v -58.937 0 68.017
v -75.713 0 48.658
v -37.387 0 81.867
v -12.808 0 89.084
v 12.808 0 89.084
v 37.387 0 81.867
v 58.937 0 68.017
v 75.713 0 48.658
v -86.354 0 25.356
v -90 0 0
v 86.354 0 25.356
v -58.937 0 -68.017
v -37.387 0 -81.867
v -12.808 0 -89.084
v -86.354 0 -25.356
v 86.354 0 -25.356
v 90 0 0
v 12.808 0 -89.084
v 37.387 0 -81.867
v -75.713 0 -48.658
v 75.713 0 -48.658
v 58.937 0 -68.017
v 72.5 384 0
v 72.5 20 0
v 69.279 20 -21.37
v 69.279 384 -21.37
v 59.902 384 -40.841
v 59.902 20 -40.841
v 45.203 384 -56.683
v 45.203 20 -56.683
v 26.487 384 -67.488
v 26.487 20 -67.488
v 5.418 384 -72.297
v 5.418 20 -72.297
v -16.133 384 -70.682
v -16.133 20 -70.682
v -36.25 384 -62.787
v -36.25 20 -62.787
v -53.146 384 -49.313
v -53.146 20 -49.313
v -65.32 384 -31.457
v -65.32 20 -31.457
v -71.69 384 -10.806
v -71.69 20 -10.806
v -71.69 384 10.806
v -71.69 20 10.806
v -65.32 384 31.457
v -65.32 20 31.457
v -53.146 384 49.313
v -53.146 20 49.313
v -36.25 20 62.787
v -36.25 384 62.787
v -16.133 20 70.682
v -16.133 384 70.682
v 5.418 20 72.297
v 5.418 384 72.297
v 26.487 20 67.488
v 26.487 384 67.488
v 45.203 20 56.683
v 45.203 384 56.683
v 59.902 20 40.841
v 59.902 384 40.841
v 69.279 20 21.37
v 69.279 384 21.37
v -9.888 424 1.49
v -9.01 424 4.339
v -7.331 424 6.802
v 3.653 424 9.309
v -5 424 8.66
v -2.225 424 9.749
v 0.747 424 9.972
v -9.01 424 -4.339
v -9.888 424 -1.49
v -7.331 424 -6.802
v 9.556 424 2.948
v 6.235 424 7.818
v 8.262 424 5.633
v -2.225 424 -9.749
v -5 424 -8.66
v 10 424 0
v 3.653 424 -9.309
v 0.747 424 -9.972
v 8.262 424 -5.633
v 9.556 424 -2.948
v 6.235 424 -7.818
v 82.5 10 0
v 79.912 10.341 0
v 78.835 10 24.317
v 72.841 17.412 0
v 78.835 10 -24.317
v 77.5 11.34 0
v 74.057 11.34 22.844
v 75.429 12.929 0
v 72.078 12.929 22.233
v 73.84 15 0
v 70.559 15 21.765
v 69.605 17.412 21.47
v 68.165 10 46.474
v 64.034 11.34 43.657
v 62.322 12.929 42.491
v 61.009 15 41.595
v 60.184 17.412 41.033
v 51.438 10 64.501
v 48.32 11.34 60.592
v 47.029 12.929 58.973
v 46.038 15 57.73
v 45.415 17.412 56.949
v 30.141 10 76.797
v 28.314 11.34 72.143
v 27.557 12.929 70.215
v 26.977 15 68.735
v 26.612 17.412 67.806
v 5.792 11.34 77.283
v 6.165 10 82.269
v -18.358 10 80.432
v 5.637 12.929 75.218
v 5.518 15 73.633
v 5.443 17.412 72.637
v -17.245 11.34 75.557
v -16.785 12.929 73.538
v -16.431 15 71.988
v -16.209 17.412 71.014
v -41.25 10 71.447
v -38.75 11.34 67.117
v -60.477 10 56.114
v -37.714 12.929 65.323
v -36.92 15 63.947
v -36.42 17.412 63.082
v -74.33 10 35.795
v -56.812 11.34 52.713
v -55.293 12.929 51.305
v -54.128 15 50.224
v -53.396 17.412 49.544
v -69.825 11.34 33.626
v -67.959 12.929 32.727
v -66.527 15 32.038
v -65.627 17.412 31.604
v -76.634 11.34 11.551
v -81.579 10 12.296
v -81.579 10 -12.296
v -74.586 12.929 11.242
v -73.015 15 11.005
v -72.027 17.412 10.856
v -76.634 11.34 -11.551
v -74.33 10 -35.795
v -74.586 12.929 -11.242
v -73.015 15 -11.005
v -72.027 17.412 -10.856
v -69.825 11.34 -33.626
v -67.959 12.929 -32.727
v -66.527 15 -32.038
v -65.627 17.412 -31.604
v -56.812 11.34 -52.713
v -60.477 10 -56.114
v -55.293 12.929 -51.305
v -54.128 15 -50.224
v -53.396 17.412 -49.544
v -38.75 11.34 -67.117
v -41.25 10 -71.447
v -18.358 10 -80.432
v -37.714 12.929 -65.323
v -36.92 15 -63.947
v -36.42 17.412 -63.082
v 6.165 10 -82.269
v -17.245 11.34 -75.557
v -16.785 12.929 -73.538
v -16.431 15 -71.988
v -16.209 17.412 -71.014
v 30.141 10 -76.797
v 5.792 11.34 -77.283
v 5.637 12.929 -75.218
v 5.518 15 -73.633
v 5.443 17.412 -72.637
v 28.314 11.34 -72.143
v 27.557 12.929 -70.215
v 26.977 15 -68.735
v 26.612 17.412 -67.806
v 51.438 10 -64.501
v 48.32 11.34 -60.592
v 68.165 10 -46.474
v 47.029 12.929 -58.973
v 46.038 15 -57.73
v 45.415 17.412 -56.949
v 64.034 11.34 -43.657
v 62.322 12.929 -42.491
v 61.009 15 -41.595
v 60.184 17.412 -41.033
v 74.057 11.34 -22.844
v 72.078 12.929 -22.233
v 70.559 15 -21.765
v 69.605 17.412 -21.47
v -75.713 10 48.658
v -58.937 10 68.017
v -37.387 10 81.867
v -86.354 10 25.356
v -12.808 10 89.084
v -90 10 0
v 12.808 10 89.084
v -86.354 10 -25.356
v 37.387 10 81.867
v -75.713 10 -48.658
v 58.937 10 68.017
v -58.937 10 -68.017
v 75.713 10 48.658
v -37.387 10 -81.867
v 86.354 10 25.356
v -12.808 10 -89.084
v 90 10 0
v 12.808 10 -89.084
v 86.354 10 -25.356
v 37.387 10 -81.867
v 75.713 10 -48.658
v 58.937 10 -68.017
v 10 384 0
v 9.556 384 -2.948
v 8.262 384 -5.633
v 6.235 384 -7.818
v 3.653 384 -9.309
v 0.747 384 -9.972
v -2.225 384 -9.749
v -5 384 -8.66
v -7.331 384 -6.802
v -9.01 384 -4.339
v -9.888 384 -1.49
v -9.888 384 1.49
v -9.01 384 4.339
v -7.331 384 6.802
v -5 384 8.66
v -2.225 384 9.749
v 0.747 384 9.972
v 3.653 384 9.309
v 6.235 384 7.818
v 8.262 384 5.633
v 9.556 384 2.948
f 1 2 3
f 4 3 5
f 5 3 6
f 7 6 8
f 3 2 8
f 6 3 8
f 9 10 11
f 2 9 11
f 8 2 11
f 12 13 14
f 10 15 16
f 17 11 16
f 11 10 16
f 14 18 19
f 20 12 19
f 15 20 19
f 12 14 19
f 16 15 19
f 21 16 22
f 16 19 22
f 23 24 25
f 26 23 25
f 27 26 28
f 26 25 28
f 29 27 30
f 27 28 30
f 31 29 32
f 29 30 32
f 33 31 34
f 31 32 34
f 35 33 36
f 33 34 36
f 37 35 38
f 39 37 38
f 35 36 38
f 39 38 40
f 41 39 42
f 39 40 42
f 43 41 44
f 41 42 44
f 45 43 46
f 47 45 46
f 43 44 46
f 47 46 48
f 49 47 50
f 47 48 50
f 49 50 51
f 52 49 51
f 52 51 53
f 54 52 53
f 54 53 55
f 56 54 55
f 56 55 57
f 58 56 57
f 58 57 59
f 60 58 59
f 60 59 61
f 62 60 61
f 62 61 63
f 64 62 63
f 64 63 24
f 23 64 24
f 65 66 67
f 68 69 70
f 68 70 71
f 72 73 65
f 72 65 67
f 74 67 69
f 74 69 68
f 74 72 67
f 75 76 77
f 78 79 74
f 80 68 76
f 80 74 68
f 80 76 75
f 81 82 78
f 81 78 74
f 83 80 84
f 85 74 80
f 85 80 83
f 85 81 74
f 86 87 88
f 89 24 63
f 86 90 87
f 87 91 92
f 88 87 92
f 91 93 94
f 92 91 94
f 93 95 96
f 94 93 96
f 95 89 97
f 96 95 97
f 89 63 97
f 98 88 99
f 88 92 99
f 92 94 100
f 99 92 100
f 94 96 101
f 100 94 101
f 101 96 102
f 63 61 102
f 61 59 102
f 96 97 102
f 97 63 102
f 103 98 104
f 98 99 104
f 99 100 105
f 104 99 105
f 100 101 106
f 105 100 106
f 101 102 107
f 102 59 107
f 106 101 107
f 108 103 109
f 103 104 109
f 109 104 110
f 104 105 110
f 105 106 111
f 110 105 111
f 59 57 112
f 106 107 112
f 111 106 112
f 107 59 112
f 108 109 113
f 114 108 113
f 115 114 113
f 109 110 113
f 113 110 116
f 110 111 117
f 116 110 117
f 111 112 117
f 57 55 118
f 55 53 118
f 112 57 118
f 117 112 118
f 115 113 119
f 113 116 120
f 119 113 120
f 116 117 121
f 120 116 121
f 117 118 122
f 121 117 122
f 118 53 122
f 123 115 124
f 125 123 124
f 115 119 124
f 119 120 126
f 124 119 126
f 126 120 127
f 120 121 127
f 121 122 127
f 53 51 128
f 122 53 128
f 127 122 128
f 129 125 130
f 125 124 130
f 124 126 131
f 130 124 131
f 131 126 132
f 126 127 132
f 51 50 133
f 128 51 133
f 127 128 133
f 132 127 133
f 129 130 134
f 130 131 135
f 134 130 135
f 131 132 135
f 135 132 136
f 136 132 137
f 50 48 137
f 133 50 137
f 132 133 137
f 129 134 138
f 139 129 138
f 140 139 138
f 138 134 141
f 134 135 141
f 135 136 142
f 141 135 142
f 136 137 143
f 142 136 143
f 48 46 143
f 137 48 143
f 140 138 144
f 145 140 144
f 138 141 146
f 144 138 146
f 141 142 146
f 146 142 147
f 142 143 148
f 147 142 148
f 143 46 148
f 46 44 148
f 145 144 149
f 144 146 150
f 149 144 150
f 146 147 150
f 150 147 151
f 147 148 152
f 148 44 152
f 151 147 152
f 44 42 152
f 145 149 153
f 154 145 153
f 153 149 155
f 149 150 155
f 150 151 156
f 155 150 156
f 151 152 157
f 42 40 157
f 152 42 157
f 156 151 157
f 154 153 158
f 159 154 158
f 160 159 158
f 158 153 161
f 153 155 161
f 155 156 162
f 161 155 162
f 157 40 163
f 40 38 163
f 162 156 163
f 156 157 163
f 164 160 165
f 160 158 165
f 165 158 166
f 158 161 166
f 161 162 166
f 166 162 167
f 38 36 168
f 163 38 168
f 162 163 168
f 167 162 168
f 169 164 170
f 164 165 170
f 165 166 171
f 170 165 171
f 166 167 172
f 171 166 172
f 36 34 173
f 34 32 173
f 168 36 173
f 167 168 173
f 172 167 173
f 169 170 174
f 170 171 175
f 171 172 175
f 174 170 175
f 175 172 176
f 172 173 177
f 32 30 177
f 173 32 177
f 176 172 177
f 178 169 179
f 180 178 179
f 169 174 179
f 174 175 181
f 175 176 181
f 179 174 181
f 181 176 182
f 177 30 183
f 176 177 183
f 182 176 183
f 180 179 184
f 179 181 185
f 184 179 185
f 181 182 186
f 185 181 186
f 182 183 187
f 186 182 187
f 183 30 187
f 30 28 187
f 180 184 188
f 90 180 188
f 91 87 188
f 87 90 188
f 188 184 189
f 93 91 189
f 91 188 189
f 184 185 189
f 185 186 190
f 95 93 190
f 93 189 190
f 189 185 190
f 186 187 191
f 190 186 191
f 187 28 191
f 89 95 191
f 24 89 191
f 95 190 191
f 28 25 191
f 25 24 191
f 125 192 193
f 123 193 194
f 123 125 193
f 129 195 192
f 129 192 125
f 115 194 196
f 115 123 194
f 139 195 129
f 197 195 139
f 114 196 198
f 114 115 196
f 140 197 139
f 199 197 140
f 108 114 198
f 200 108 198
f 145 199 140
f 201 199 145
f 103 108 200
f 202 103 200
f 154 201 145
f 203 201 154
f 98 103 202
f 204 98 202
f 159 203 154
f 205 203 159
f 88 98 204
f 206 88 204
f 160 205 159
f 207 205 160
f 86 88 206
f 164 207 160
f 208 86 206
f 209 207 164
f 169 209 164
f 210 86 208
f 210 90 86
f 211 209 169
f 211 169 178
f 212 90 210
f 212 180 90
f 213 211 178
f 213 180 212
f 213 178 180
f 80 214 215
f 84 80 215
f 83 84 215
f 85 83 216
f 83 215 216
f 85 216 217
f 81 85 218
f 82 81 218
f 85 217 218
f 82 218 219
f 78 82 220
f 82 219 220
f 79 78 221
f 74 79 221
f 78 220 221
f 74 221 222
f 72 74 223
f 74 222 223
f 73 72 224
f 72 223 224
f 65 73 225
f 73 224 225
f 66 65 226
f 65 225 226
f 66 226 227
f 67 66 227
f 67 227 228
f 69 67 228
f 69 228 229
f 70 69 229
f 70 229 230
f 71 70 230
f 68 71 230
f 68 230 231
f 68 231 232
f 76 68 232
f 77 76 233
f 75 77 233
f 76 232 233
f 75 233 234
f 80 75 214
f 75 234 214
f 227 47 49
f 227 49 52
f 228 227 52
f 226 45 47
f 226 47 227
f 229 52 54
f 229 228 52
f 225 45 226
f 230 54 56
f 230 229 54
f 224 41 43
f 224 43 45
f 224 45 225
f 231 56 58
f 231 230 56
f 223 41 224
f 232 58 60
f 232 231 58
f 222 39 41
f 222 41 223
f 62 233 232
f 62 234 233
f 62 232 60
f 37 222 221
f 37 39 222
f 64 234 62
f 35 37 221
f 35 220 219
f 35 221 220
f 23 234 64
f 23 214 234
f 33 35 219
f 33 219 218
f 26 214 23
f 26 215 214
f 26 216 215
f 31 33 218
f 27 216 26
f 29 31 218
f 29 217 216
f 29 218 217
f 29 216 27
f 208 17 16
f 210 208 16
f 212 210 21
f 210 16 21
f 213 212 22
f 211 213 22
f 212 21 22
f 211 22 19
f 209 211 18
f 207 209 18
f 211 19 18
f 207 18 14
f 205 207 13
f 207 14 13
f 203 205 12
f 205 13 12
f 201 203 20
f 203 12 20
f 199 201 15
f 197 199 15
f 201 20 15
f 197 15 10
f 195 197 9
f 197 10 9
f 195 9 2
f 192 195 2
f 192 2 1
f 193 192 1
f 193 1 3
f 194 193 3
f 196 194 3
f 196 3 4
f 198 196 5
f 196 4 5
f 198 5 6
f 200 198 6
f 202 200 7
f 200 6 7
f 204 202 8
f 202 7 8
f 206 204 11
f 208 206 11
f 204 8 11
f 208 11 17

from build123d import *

# Parameters (mm, degrees)
SKETCH1_R           = 72.5
BOSS_EXTRUDE1_DEPTH = 384
SKETCH2_R           = 90
BOSS_EXTRUDE2_DEPTH = 10
FILLET1_R           = 10
SKETCH3_R           = 10
BOSS_EXTRUDE3_DEPTH = 40


with BuildPart() as part:
    # Sketch1 → Boss-Extrude1 (new body)
    with BuildSketch(Plane(origin=(0, 0, 0), x_dir=(1, 0, 0), z_dir=(0, 1, 0))):
        Circle(SKETCH1_R)
    extrude(amount=BOSS_EXTRUDE1_DEPTH)

    # Sketch2 → Boss-Extrude2 (add)
    with BuildSketch(Plane(origin=(0, 0, 0), x_dir=(1, 0, 0), z_dir=(0, 1, 0))):
        Circle(SKETCH2_R)
    extrude(amount=BOSS_EXTRUDE2_DEPTH)

    # Fillet1
    fillet1_edges = [part.edges().sort_by_distance(p)[0] for p in [
        (-72.5, 10, 0),
    ]]
    fillet(fillet1_edges, radius=FILLET1_R)

    # Sketch3 → Boss-Extrude3 (add)
    with BuildSketch(Plane(origin=(0, 384, 0), x_dir=(1, 0, 0), z_dir=(0, 1, 0))):
        Circle(SKETCH3_R)
    extrude(amount=BOSS_EXTRUDE3_DEPTH)


solid = part.part
